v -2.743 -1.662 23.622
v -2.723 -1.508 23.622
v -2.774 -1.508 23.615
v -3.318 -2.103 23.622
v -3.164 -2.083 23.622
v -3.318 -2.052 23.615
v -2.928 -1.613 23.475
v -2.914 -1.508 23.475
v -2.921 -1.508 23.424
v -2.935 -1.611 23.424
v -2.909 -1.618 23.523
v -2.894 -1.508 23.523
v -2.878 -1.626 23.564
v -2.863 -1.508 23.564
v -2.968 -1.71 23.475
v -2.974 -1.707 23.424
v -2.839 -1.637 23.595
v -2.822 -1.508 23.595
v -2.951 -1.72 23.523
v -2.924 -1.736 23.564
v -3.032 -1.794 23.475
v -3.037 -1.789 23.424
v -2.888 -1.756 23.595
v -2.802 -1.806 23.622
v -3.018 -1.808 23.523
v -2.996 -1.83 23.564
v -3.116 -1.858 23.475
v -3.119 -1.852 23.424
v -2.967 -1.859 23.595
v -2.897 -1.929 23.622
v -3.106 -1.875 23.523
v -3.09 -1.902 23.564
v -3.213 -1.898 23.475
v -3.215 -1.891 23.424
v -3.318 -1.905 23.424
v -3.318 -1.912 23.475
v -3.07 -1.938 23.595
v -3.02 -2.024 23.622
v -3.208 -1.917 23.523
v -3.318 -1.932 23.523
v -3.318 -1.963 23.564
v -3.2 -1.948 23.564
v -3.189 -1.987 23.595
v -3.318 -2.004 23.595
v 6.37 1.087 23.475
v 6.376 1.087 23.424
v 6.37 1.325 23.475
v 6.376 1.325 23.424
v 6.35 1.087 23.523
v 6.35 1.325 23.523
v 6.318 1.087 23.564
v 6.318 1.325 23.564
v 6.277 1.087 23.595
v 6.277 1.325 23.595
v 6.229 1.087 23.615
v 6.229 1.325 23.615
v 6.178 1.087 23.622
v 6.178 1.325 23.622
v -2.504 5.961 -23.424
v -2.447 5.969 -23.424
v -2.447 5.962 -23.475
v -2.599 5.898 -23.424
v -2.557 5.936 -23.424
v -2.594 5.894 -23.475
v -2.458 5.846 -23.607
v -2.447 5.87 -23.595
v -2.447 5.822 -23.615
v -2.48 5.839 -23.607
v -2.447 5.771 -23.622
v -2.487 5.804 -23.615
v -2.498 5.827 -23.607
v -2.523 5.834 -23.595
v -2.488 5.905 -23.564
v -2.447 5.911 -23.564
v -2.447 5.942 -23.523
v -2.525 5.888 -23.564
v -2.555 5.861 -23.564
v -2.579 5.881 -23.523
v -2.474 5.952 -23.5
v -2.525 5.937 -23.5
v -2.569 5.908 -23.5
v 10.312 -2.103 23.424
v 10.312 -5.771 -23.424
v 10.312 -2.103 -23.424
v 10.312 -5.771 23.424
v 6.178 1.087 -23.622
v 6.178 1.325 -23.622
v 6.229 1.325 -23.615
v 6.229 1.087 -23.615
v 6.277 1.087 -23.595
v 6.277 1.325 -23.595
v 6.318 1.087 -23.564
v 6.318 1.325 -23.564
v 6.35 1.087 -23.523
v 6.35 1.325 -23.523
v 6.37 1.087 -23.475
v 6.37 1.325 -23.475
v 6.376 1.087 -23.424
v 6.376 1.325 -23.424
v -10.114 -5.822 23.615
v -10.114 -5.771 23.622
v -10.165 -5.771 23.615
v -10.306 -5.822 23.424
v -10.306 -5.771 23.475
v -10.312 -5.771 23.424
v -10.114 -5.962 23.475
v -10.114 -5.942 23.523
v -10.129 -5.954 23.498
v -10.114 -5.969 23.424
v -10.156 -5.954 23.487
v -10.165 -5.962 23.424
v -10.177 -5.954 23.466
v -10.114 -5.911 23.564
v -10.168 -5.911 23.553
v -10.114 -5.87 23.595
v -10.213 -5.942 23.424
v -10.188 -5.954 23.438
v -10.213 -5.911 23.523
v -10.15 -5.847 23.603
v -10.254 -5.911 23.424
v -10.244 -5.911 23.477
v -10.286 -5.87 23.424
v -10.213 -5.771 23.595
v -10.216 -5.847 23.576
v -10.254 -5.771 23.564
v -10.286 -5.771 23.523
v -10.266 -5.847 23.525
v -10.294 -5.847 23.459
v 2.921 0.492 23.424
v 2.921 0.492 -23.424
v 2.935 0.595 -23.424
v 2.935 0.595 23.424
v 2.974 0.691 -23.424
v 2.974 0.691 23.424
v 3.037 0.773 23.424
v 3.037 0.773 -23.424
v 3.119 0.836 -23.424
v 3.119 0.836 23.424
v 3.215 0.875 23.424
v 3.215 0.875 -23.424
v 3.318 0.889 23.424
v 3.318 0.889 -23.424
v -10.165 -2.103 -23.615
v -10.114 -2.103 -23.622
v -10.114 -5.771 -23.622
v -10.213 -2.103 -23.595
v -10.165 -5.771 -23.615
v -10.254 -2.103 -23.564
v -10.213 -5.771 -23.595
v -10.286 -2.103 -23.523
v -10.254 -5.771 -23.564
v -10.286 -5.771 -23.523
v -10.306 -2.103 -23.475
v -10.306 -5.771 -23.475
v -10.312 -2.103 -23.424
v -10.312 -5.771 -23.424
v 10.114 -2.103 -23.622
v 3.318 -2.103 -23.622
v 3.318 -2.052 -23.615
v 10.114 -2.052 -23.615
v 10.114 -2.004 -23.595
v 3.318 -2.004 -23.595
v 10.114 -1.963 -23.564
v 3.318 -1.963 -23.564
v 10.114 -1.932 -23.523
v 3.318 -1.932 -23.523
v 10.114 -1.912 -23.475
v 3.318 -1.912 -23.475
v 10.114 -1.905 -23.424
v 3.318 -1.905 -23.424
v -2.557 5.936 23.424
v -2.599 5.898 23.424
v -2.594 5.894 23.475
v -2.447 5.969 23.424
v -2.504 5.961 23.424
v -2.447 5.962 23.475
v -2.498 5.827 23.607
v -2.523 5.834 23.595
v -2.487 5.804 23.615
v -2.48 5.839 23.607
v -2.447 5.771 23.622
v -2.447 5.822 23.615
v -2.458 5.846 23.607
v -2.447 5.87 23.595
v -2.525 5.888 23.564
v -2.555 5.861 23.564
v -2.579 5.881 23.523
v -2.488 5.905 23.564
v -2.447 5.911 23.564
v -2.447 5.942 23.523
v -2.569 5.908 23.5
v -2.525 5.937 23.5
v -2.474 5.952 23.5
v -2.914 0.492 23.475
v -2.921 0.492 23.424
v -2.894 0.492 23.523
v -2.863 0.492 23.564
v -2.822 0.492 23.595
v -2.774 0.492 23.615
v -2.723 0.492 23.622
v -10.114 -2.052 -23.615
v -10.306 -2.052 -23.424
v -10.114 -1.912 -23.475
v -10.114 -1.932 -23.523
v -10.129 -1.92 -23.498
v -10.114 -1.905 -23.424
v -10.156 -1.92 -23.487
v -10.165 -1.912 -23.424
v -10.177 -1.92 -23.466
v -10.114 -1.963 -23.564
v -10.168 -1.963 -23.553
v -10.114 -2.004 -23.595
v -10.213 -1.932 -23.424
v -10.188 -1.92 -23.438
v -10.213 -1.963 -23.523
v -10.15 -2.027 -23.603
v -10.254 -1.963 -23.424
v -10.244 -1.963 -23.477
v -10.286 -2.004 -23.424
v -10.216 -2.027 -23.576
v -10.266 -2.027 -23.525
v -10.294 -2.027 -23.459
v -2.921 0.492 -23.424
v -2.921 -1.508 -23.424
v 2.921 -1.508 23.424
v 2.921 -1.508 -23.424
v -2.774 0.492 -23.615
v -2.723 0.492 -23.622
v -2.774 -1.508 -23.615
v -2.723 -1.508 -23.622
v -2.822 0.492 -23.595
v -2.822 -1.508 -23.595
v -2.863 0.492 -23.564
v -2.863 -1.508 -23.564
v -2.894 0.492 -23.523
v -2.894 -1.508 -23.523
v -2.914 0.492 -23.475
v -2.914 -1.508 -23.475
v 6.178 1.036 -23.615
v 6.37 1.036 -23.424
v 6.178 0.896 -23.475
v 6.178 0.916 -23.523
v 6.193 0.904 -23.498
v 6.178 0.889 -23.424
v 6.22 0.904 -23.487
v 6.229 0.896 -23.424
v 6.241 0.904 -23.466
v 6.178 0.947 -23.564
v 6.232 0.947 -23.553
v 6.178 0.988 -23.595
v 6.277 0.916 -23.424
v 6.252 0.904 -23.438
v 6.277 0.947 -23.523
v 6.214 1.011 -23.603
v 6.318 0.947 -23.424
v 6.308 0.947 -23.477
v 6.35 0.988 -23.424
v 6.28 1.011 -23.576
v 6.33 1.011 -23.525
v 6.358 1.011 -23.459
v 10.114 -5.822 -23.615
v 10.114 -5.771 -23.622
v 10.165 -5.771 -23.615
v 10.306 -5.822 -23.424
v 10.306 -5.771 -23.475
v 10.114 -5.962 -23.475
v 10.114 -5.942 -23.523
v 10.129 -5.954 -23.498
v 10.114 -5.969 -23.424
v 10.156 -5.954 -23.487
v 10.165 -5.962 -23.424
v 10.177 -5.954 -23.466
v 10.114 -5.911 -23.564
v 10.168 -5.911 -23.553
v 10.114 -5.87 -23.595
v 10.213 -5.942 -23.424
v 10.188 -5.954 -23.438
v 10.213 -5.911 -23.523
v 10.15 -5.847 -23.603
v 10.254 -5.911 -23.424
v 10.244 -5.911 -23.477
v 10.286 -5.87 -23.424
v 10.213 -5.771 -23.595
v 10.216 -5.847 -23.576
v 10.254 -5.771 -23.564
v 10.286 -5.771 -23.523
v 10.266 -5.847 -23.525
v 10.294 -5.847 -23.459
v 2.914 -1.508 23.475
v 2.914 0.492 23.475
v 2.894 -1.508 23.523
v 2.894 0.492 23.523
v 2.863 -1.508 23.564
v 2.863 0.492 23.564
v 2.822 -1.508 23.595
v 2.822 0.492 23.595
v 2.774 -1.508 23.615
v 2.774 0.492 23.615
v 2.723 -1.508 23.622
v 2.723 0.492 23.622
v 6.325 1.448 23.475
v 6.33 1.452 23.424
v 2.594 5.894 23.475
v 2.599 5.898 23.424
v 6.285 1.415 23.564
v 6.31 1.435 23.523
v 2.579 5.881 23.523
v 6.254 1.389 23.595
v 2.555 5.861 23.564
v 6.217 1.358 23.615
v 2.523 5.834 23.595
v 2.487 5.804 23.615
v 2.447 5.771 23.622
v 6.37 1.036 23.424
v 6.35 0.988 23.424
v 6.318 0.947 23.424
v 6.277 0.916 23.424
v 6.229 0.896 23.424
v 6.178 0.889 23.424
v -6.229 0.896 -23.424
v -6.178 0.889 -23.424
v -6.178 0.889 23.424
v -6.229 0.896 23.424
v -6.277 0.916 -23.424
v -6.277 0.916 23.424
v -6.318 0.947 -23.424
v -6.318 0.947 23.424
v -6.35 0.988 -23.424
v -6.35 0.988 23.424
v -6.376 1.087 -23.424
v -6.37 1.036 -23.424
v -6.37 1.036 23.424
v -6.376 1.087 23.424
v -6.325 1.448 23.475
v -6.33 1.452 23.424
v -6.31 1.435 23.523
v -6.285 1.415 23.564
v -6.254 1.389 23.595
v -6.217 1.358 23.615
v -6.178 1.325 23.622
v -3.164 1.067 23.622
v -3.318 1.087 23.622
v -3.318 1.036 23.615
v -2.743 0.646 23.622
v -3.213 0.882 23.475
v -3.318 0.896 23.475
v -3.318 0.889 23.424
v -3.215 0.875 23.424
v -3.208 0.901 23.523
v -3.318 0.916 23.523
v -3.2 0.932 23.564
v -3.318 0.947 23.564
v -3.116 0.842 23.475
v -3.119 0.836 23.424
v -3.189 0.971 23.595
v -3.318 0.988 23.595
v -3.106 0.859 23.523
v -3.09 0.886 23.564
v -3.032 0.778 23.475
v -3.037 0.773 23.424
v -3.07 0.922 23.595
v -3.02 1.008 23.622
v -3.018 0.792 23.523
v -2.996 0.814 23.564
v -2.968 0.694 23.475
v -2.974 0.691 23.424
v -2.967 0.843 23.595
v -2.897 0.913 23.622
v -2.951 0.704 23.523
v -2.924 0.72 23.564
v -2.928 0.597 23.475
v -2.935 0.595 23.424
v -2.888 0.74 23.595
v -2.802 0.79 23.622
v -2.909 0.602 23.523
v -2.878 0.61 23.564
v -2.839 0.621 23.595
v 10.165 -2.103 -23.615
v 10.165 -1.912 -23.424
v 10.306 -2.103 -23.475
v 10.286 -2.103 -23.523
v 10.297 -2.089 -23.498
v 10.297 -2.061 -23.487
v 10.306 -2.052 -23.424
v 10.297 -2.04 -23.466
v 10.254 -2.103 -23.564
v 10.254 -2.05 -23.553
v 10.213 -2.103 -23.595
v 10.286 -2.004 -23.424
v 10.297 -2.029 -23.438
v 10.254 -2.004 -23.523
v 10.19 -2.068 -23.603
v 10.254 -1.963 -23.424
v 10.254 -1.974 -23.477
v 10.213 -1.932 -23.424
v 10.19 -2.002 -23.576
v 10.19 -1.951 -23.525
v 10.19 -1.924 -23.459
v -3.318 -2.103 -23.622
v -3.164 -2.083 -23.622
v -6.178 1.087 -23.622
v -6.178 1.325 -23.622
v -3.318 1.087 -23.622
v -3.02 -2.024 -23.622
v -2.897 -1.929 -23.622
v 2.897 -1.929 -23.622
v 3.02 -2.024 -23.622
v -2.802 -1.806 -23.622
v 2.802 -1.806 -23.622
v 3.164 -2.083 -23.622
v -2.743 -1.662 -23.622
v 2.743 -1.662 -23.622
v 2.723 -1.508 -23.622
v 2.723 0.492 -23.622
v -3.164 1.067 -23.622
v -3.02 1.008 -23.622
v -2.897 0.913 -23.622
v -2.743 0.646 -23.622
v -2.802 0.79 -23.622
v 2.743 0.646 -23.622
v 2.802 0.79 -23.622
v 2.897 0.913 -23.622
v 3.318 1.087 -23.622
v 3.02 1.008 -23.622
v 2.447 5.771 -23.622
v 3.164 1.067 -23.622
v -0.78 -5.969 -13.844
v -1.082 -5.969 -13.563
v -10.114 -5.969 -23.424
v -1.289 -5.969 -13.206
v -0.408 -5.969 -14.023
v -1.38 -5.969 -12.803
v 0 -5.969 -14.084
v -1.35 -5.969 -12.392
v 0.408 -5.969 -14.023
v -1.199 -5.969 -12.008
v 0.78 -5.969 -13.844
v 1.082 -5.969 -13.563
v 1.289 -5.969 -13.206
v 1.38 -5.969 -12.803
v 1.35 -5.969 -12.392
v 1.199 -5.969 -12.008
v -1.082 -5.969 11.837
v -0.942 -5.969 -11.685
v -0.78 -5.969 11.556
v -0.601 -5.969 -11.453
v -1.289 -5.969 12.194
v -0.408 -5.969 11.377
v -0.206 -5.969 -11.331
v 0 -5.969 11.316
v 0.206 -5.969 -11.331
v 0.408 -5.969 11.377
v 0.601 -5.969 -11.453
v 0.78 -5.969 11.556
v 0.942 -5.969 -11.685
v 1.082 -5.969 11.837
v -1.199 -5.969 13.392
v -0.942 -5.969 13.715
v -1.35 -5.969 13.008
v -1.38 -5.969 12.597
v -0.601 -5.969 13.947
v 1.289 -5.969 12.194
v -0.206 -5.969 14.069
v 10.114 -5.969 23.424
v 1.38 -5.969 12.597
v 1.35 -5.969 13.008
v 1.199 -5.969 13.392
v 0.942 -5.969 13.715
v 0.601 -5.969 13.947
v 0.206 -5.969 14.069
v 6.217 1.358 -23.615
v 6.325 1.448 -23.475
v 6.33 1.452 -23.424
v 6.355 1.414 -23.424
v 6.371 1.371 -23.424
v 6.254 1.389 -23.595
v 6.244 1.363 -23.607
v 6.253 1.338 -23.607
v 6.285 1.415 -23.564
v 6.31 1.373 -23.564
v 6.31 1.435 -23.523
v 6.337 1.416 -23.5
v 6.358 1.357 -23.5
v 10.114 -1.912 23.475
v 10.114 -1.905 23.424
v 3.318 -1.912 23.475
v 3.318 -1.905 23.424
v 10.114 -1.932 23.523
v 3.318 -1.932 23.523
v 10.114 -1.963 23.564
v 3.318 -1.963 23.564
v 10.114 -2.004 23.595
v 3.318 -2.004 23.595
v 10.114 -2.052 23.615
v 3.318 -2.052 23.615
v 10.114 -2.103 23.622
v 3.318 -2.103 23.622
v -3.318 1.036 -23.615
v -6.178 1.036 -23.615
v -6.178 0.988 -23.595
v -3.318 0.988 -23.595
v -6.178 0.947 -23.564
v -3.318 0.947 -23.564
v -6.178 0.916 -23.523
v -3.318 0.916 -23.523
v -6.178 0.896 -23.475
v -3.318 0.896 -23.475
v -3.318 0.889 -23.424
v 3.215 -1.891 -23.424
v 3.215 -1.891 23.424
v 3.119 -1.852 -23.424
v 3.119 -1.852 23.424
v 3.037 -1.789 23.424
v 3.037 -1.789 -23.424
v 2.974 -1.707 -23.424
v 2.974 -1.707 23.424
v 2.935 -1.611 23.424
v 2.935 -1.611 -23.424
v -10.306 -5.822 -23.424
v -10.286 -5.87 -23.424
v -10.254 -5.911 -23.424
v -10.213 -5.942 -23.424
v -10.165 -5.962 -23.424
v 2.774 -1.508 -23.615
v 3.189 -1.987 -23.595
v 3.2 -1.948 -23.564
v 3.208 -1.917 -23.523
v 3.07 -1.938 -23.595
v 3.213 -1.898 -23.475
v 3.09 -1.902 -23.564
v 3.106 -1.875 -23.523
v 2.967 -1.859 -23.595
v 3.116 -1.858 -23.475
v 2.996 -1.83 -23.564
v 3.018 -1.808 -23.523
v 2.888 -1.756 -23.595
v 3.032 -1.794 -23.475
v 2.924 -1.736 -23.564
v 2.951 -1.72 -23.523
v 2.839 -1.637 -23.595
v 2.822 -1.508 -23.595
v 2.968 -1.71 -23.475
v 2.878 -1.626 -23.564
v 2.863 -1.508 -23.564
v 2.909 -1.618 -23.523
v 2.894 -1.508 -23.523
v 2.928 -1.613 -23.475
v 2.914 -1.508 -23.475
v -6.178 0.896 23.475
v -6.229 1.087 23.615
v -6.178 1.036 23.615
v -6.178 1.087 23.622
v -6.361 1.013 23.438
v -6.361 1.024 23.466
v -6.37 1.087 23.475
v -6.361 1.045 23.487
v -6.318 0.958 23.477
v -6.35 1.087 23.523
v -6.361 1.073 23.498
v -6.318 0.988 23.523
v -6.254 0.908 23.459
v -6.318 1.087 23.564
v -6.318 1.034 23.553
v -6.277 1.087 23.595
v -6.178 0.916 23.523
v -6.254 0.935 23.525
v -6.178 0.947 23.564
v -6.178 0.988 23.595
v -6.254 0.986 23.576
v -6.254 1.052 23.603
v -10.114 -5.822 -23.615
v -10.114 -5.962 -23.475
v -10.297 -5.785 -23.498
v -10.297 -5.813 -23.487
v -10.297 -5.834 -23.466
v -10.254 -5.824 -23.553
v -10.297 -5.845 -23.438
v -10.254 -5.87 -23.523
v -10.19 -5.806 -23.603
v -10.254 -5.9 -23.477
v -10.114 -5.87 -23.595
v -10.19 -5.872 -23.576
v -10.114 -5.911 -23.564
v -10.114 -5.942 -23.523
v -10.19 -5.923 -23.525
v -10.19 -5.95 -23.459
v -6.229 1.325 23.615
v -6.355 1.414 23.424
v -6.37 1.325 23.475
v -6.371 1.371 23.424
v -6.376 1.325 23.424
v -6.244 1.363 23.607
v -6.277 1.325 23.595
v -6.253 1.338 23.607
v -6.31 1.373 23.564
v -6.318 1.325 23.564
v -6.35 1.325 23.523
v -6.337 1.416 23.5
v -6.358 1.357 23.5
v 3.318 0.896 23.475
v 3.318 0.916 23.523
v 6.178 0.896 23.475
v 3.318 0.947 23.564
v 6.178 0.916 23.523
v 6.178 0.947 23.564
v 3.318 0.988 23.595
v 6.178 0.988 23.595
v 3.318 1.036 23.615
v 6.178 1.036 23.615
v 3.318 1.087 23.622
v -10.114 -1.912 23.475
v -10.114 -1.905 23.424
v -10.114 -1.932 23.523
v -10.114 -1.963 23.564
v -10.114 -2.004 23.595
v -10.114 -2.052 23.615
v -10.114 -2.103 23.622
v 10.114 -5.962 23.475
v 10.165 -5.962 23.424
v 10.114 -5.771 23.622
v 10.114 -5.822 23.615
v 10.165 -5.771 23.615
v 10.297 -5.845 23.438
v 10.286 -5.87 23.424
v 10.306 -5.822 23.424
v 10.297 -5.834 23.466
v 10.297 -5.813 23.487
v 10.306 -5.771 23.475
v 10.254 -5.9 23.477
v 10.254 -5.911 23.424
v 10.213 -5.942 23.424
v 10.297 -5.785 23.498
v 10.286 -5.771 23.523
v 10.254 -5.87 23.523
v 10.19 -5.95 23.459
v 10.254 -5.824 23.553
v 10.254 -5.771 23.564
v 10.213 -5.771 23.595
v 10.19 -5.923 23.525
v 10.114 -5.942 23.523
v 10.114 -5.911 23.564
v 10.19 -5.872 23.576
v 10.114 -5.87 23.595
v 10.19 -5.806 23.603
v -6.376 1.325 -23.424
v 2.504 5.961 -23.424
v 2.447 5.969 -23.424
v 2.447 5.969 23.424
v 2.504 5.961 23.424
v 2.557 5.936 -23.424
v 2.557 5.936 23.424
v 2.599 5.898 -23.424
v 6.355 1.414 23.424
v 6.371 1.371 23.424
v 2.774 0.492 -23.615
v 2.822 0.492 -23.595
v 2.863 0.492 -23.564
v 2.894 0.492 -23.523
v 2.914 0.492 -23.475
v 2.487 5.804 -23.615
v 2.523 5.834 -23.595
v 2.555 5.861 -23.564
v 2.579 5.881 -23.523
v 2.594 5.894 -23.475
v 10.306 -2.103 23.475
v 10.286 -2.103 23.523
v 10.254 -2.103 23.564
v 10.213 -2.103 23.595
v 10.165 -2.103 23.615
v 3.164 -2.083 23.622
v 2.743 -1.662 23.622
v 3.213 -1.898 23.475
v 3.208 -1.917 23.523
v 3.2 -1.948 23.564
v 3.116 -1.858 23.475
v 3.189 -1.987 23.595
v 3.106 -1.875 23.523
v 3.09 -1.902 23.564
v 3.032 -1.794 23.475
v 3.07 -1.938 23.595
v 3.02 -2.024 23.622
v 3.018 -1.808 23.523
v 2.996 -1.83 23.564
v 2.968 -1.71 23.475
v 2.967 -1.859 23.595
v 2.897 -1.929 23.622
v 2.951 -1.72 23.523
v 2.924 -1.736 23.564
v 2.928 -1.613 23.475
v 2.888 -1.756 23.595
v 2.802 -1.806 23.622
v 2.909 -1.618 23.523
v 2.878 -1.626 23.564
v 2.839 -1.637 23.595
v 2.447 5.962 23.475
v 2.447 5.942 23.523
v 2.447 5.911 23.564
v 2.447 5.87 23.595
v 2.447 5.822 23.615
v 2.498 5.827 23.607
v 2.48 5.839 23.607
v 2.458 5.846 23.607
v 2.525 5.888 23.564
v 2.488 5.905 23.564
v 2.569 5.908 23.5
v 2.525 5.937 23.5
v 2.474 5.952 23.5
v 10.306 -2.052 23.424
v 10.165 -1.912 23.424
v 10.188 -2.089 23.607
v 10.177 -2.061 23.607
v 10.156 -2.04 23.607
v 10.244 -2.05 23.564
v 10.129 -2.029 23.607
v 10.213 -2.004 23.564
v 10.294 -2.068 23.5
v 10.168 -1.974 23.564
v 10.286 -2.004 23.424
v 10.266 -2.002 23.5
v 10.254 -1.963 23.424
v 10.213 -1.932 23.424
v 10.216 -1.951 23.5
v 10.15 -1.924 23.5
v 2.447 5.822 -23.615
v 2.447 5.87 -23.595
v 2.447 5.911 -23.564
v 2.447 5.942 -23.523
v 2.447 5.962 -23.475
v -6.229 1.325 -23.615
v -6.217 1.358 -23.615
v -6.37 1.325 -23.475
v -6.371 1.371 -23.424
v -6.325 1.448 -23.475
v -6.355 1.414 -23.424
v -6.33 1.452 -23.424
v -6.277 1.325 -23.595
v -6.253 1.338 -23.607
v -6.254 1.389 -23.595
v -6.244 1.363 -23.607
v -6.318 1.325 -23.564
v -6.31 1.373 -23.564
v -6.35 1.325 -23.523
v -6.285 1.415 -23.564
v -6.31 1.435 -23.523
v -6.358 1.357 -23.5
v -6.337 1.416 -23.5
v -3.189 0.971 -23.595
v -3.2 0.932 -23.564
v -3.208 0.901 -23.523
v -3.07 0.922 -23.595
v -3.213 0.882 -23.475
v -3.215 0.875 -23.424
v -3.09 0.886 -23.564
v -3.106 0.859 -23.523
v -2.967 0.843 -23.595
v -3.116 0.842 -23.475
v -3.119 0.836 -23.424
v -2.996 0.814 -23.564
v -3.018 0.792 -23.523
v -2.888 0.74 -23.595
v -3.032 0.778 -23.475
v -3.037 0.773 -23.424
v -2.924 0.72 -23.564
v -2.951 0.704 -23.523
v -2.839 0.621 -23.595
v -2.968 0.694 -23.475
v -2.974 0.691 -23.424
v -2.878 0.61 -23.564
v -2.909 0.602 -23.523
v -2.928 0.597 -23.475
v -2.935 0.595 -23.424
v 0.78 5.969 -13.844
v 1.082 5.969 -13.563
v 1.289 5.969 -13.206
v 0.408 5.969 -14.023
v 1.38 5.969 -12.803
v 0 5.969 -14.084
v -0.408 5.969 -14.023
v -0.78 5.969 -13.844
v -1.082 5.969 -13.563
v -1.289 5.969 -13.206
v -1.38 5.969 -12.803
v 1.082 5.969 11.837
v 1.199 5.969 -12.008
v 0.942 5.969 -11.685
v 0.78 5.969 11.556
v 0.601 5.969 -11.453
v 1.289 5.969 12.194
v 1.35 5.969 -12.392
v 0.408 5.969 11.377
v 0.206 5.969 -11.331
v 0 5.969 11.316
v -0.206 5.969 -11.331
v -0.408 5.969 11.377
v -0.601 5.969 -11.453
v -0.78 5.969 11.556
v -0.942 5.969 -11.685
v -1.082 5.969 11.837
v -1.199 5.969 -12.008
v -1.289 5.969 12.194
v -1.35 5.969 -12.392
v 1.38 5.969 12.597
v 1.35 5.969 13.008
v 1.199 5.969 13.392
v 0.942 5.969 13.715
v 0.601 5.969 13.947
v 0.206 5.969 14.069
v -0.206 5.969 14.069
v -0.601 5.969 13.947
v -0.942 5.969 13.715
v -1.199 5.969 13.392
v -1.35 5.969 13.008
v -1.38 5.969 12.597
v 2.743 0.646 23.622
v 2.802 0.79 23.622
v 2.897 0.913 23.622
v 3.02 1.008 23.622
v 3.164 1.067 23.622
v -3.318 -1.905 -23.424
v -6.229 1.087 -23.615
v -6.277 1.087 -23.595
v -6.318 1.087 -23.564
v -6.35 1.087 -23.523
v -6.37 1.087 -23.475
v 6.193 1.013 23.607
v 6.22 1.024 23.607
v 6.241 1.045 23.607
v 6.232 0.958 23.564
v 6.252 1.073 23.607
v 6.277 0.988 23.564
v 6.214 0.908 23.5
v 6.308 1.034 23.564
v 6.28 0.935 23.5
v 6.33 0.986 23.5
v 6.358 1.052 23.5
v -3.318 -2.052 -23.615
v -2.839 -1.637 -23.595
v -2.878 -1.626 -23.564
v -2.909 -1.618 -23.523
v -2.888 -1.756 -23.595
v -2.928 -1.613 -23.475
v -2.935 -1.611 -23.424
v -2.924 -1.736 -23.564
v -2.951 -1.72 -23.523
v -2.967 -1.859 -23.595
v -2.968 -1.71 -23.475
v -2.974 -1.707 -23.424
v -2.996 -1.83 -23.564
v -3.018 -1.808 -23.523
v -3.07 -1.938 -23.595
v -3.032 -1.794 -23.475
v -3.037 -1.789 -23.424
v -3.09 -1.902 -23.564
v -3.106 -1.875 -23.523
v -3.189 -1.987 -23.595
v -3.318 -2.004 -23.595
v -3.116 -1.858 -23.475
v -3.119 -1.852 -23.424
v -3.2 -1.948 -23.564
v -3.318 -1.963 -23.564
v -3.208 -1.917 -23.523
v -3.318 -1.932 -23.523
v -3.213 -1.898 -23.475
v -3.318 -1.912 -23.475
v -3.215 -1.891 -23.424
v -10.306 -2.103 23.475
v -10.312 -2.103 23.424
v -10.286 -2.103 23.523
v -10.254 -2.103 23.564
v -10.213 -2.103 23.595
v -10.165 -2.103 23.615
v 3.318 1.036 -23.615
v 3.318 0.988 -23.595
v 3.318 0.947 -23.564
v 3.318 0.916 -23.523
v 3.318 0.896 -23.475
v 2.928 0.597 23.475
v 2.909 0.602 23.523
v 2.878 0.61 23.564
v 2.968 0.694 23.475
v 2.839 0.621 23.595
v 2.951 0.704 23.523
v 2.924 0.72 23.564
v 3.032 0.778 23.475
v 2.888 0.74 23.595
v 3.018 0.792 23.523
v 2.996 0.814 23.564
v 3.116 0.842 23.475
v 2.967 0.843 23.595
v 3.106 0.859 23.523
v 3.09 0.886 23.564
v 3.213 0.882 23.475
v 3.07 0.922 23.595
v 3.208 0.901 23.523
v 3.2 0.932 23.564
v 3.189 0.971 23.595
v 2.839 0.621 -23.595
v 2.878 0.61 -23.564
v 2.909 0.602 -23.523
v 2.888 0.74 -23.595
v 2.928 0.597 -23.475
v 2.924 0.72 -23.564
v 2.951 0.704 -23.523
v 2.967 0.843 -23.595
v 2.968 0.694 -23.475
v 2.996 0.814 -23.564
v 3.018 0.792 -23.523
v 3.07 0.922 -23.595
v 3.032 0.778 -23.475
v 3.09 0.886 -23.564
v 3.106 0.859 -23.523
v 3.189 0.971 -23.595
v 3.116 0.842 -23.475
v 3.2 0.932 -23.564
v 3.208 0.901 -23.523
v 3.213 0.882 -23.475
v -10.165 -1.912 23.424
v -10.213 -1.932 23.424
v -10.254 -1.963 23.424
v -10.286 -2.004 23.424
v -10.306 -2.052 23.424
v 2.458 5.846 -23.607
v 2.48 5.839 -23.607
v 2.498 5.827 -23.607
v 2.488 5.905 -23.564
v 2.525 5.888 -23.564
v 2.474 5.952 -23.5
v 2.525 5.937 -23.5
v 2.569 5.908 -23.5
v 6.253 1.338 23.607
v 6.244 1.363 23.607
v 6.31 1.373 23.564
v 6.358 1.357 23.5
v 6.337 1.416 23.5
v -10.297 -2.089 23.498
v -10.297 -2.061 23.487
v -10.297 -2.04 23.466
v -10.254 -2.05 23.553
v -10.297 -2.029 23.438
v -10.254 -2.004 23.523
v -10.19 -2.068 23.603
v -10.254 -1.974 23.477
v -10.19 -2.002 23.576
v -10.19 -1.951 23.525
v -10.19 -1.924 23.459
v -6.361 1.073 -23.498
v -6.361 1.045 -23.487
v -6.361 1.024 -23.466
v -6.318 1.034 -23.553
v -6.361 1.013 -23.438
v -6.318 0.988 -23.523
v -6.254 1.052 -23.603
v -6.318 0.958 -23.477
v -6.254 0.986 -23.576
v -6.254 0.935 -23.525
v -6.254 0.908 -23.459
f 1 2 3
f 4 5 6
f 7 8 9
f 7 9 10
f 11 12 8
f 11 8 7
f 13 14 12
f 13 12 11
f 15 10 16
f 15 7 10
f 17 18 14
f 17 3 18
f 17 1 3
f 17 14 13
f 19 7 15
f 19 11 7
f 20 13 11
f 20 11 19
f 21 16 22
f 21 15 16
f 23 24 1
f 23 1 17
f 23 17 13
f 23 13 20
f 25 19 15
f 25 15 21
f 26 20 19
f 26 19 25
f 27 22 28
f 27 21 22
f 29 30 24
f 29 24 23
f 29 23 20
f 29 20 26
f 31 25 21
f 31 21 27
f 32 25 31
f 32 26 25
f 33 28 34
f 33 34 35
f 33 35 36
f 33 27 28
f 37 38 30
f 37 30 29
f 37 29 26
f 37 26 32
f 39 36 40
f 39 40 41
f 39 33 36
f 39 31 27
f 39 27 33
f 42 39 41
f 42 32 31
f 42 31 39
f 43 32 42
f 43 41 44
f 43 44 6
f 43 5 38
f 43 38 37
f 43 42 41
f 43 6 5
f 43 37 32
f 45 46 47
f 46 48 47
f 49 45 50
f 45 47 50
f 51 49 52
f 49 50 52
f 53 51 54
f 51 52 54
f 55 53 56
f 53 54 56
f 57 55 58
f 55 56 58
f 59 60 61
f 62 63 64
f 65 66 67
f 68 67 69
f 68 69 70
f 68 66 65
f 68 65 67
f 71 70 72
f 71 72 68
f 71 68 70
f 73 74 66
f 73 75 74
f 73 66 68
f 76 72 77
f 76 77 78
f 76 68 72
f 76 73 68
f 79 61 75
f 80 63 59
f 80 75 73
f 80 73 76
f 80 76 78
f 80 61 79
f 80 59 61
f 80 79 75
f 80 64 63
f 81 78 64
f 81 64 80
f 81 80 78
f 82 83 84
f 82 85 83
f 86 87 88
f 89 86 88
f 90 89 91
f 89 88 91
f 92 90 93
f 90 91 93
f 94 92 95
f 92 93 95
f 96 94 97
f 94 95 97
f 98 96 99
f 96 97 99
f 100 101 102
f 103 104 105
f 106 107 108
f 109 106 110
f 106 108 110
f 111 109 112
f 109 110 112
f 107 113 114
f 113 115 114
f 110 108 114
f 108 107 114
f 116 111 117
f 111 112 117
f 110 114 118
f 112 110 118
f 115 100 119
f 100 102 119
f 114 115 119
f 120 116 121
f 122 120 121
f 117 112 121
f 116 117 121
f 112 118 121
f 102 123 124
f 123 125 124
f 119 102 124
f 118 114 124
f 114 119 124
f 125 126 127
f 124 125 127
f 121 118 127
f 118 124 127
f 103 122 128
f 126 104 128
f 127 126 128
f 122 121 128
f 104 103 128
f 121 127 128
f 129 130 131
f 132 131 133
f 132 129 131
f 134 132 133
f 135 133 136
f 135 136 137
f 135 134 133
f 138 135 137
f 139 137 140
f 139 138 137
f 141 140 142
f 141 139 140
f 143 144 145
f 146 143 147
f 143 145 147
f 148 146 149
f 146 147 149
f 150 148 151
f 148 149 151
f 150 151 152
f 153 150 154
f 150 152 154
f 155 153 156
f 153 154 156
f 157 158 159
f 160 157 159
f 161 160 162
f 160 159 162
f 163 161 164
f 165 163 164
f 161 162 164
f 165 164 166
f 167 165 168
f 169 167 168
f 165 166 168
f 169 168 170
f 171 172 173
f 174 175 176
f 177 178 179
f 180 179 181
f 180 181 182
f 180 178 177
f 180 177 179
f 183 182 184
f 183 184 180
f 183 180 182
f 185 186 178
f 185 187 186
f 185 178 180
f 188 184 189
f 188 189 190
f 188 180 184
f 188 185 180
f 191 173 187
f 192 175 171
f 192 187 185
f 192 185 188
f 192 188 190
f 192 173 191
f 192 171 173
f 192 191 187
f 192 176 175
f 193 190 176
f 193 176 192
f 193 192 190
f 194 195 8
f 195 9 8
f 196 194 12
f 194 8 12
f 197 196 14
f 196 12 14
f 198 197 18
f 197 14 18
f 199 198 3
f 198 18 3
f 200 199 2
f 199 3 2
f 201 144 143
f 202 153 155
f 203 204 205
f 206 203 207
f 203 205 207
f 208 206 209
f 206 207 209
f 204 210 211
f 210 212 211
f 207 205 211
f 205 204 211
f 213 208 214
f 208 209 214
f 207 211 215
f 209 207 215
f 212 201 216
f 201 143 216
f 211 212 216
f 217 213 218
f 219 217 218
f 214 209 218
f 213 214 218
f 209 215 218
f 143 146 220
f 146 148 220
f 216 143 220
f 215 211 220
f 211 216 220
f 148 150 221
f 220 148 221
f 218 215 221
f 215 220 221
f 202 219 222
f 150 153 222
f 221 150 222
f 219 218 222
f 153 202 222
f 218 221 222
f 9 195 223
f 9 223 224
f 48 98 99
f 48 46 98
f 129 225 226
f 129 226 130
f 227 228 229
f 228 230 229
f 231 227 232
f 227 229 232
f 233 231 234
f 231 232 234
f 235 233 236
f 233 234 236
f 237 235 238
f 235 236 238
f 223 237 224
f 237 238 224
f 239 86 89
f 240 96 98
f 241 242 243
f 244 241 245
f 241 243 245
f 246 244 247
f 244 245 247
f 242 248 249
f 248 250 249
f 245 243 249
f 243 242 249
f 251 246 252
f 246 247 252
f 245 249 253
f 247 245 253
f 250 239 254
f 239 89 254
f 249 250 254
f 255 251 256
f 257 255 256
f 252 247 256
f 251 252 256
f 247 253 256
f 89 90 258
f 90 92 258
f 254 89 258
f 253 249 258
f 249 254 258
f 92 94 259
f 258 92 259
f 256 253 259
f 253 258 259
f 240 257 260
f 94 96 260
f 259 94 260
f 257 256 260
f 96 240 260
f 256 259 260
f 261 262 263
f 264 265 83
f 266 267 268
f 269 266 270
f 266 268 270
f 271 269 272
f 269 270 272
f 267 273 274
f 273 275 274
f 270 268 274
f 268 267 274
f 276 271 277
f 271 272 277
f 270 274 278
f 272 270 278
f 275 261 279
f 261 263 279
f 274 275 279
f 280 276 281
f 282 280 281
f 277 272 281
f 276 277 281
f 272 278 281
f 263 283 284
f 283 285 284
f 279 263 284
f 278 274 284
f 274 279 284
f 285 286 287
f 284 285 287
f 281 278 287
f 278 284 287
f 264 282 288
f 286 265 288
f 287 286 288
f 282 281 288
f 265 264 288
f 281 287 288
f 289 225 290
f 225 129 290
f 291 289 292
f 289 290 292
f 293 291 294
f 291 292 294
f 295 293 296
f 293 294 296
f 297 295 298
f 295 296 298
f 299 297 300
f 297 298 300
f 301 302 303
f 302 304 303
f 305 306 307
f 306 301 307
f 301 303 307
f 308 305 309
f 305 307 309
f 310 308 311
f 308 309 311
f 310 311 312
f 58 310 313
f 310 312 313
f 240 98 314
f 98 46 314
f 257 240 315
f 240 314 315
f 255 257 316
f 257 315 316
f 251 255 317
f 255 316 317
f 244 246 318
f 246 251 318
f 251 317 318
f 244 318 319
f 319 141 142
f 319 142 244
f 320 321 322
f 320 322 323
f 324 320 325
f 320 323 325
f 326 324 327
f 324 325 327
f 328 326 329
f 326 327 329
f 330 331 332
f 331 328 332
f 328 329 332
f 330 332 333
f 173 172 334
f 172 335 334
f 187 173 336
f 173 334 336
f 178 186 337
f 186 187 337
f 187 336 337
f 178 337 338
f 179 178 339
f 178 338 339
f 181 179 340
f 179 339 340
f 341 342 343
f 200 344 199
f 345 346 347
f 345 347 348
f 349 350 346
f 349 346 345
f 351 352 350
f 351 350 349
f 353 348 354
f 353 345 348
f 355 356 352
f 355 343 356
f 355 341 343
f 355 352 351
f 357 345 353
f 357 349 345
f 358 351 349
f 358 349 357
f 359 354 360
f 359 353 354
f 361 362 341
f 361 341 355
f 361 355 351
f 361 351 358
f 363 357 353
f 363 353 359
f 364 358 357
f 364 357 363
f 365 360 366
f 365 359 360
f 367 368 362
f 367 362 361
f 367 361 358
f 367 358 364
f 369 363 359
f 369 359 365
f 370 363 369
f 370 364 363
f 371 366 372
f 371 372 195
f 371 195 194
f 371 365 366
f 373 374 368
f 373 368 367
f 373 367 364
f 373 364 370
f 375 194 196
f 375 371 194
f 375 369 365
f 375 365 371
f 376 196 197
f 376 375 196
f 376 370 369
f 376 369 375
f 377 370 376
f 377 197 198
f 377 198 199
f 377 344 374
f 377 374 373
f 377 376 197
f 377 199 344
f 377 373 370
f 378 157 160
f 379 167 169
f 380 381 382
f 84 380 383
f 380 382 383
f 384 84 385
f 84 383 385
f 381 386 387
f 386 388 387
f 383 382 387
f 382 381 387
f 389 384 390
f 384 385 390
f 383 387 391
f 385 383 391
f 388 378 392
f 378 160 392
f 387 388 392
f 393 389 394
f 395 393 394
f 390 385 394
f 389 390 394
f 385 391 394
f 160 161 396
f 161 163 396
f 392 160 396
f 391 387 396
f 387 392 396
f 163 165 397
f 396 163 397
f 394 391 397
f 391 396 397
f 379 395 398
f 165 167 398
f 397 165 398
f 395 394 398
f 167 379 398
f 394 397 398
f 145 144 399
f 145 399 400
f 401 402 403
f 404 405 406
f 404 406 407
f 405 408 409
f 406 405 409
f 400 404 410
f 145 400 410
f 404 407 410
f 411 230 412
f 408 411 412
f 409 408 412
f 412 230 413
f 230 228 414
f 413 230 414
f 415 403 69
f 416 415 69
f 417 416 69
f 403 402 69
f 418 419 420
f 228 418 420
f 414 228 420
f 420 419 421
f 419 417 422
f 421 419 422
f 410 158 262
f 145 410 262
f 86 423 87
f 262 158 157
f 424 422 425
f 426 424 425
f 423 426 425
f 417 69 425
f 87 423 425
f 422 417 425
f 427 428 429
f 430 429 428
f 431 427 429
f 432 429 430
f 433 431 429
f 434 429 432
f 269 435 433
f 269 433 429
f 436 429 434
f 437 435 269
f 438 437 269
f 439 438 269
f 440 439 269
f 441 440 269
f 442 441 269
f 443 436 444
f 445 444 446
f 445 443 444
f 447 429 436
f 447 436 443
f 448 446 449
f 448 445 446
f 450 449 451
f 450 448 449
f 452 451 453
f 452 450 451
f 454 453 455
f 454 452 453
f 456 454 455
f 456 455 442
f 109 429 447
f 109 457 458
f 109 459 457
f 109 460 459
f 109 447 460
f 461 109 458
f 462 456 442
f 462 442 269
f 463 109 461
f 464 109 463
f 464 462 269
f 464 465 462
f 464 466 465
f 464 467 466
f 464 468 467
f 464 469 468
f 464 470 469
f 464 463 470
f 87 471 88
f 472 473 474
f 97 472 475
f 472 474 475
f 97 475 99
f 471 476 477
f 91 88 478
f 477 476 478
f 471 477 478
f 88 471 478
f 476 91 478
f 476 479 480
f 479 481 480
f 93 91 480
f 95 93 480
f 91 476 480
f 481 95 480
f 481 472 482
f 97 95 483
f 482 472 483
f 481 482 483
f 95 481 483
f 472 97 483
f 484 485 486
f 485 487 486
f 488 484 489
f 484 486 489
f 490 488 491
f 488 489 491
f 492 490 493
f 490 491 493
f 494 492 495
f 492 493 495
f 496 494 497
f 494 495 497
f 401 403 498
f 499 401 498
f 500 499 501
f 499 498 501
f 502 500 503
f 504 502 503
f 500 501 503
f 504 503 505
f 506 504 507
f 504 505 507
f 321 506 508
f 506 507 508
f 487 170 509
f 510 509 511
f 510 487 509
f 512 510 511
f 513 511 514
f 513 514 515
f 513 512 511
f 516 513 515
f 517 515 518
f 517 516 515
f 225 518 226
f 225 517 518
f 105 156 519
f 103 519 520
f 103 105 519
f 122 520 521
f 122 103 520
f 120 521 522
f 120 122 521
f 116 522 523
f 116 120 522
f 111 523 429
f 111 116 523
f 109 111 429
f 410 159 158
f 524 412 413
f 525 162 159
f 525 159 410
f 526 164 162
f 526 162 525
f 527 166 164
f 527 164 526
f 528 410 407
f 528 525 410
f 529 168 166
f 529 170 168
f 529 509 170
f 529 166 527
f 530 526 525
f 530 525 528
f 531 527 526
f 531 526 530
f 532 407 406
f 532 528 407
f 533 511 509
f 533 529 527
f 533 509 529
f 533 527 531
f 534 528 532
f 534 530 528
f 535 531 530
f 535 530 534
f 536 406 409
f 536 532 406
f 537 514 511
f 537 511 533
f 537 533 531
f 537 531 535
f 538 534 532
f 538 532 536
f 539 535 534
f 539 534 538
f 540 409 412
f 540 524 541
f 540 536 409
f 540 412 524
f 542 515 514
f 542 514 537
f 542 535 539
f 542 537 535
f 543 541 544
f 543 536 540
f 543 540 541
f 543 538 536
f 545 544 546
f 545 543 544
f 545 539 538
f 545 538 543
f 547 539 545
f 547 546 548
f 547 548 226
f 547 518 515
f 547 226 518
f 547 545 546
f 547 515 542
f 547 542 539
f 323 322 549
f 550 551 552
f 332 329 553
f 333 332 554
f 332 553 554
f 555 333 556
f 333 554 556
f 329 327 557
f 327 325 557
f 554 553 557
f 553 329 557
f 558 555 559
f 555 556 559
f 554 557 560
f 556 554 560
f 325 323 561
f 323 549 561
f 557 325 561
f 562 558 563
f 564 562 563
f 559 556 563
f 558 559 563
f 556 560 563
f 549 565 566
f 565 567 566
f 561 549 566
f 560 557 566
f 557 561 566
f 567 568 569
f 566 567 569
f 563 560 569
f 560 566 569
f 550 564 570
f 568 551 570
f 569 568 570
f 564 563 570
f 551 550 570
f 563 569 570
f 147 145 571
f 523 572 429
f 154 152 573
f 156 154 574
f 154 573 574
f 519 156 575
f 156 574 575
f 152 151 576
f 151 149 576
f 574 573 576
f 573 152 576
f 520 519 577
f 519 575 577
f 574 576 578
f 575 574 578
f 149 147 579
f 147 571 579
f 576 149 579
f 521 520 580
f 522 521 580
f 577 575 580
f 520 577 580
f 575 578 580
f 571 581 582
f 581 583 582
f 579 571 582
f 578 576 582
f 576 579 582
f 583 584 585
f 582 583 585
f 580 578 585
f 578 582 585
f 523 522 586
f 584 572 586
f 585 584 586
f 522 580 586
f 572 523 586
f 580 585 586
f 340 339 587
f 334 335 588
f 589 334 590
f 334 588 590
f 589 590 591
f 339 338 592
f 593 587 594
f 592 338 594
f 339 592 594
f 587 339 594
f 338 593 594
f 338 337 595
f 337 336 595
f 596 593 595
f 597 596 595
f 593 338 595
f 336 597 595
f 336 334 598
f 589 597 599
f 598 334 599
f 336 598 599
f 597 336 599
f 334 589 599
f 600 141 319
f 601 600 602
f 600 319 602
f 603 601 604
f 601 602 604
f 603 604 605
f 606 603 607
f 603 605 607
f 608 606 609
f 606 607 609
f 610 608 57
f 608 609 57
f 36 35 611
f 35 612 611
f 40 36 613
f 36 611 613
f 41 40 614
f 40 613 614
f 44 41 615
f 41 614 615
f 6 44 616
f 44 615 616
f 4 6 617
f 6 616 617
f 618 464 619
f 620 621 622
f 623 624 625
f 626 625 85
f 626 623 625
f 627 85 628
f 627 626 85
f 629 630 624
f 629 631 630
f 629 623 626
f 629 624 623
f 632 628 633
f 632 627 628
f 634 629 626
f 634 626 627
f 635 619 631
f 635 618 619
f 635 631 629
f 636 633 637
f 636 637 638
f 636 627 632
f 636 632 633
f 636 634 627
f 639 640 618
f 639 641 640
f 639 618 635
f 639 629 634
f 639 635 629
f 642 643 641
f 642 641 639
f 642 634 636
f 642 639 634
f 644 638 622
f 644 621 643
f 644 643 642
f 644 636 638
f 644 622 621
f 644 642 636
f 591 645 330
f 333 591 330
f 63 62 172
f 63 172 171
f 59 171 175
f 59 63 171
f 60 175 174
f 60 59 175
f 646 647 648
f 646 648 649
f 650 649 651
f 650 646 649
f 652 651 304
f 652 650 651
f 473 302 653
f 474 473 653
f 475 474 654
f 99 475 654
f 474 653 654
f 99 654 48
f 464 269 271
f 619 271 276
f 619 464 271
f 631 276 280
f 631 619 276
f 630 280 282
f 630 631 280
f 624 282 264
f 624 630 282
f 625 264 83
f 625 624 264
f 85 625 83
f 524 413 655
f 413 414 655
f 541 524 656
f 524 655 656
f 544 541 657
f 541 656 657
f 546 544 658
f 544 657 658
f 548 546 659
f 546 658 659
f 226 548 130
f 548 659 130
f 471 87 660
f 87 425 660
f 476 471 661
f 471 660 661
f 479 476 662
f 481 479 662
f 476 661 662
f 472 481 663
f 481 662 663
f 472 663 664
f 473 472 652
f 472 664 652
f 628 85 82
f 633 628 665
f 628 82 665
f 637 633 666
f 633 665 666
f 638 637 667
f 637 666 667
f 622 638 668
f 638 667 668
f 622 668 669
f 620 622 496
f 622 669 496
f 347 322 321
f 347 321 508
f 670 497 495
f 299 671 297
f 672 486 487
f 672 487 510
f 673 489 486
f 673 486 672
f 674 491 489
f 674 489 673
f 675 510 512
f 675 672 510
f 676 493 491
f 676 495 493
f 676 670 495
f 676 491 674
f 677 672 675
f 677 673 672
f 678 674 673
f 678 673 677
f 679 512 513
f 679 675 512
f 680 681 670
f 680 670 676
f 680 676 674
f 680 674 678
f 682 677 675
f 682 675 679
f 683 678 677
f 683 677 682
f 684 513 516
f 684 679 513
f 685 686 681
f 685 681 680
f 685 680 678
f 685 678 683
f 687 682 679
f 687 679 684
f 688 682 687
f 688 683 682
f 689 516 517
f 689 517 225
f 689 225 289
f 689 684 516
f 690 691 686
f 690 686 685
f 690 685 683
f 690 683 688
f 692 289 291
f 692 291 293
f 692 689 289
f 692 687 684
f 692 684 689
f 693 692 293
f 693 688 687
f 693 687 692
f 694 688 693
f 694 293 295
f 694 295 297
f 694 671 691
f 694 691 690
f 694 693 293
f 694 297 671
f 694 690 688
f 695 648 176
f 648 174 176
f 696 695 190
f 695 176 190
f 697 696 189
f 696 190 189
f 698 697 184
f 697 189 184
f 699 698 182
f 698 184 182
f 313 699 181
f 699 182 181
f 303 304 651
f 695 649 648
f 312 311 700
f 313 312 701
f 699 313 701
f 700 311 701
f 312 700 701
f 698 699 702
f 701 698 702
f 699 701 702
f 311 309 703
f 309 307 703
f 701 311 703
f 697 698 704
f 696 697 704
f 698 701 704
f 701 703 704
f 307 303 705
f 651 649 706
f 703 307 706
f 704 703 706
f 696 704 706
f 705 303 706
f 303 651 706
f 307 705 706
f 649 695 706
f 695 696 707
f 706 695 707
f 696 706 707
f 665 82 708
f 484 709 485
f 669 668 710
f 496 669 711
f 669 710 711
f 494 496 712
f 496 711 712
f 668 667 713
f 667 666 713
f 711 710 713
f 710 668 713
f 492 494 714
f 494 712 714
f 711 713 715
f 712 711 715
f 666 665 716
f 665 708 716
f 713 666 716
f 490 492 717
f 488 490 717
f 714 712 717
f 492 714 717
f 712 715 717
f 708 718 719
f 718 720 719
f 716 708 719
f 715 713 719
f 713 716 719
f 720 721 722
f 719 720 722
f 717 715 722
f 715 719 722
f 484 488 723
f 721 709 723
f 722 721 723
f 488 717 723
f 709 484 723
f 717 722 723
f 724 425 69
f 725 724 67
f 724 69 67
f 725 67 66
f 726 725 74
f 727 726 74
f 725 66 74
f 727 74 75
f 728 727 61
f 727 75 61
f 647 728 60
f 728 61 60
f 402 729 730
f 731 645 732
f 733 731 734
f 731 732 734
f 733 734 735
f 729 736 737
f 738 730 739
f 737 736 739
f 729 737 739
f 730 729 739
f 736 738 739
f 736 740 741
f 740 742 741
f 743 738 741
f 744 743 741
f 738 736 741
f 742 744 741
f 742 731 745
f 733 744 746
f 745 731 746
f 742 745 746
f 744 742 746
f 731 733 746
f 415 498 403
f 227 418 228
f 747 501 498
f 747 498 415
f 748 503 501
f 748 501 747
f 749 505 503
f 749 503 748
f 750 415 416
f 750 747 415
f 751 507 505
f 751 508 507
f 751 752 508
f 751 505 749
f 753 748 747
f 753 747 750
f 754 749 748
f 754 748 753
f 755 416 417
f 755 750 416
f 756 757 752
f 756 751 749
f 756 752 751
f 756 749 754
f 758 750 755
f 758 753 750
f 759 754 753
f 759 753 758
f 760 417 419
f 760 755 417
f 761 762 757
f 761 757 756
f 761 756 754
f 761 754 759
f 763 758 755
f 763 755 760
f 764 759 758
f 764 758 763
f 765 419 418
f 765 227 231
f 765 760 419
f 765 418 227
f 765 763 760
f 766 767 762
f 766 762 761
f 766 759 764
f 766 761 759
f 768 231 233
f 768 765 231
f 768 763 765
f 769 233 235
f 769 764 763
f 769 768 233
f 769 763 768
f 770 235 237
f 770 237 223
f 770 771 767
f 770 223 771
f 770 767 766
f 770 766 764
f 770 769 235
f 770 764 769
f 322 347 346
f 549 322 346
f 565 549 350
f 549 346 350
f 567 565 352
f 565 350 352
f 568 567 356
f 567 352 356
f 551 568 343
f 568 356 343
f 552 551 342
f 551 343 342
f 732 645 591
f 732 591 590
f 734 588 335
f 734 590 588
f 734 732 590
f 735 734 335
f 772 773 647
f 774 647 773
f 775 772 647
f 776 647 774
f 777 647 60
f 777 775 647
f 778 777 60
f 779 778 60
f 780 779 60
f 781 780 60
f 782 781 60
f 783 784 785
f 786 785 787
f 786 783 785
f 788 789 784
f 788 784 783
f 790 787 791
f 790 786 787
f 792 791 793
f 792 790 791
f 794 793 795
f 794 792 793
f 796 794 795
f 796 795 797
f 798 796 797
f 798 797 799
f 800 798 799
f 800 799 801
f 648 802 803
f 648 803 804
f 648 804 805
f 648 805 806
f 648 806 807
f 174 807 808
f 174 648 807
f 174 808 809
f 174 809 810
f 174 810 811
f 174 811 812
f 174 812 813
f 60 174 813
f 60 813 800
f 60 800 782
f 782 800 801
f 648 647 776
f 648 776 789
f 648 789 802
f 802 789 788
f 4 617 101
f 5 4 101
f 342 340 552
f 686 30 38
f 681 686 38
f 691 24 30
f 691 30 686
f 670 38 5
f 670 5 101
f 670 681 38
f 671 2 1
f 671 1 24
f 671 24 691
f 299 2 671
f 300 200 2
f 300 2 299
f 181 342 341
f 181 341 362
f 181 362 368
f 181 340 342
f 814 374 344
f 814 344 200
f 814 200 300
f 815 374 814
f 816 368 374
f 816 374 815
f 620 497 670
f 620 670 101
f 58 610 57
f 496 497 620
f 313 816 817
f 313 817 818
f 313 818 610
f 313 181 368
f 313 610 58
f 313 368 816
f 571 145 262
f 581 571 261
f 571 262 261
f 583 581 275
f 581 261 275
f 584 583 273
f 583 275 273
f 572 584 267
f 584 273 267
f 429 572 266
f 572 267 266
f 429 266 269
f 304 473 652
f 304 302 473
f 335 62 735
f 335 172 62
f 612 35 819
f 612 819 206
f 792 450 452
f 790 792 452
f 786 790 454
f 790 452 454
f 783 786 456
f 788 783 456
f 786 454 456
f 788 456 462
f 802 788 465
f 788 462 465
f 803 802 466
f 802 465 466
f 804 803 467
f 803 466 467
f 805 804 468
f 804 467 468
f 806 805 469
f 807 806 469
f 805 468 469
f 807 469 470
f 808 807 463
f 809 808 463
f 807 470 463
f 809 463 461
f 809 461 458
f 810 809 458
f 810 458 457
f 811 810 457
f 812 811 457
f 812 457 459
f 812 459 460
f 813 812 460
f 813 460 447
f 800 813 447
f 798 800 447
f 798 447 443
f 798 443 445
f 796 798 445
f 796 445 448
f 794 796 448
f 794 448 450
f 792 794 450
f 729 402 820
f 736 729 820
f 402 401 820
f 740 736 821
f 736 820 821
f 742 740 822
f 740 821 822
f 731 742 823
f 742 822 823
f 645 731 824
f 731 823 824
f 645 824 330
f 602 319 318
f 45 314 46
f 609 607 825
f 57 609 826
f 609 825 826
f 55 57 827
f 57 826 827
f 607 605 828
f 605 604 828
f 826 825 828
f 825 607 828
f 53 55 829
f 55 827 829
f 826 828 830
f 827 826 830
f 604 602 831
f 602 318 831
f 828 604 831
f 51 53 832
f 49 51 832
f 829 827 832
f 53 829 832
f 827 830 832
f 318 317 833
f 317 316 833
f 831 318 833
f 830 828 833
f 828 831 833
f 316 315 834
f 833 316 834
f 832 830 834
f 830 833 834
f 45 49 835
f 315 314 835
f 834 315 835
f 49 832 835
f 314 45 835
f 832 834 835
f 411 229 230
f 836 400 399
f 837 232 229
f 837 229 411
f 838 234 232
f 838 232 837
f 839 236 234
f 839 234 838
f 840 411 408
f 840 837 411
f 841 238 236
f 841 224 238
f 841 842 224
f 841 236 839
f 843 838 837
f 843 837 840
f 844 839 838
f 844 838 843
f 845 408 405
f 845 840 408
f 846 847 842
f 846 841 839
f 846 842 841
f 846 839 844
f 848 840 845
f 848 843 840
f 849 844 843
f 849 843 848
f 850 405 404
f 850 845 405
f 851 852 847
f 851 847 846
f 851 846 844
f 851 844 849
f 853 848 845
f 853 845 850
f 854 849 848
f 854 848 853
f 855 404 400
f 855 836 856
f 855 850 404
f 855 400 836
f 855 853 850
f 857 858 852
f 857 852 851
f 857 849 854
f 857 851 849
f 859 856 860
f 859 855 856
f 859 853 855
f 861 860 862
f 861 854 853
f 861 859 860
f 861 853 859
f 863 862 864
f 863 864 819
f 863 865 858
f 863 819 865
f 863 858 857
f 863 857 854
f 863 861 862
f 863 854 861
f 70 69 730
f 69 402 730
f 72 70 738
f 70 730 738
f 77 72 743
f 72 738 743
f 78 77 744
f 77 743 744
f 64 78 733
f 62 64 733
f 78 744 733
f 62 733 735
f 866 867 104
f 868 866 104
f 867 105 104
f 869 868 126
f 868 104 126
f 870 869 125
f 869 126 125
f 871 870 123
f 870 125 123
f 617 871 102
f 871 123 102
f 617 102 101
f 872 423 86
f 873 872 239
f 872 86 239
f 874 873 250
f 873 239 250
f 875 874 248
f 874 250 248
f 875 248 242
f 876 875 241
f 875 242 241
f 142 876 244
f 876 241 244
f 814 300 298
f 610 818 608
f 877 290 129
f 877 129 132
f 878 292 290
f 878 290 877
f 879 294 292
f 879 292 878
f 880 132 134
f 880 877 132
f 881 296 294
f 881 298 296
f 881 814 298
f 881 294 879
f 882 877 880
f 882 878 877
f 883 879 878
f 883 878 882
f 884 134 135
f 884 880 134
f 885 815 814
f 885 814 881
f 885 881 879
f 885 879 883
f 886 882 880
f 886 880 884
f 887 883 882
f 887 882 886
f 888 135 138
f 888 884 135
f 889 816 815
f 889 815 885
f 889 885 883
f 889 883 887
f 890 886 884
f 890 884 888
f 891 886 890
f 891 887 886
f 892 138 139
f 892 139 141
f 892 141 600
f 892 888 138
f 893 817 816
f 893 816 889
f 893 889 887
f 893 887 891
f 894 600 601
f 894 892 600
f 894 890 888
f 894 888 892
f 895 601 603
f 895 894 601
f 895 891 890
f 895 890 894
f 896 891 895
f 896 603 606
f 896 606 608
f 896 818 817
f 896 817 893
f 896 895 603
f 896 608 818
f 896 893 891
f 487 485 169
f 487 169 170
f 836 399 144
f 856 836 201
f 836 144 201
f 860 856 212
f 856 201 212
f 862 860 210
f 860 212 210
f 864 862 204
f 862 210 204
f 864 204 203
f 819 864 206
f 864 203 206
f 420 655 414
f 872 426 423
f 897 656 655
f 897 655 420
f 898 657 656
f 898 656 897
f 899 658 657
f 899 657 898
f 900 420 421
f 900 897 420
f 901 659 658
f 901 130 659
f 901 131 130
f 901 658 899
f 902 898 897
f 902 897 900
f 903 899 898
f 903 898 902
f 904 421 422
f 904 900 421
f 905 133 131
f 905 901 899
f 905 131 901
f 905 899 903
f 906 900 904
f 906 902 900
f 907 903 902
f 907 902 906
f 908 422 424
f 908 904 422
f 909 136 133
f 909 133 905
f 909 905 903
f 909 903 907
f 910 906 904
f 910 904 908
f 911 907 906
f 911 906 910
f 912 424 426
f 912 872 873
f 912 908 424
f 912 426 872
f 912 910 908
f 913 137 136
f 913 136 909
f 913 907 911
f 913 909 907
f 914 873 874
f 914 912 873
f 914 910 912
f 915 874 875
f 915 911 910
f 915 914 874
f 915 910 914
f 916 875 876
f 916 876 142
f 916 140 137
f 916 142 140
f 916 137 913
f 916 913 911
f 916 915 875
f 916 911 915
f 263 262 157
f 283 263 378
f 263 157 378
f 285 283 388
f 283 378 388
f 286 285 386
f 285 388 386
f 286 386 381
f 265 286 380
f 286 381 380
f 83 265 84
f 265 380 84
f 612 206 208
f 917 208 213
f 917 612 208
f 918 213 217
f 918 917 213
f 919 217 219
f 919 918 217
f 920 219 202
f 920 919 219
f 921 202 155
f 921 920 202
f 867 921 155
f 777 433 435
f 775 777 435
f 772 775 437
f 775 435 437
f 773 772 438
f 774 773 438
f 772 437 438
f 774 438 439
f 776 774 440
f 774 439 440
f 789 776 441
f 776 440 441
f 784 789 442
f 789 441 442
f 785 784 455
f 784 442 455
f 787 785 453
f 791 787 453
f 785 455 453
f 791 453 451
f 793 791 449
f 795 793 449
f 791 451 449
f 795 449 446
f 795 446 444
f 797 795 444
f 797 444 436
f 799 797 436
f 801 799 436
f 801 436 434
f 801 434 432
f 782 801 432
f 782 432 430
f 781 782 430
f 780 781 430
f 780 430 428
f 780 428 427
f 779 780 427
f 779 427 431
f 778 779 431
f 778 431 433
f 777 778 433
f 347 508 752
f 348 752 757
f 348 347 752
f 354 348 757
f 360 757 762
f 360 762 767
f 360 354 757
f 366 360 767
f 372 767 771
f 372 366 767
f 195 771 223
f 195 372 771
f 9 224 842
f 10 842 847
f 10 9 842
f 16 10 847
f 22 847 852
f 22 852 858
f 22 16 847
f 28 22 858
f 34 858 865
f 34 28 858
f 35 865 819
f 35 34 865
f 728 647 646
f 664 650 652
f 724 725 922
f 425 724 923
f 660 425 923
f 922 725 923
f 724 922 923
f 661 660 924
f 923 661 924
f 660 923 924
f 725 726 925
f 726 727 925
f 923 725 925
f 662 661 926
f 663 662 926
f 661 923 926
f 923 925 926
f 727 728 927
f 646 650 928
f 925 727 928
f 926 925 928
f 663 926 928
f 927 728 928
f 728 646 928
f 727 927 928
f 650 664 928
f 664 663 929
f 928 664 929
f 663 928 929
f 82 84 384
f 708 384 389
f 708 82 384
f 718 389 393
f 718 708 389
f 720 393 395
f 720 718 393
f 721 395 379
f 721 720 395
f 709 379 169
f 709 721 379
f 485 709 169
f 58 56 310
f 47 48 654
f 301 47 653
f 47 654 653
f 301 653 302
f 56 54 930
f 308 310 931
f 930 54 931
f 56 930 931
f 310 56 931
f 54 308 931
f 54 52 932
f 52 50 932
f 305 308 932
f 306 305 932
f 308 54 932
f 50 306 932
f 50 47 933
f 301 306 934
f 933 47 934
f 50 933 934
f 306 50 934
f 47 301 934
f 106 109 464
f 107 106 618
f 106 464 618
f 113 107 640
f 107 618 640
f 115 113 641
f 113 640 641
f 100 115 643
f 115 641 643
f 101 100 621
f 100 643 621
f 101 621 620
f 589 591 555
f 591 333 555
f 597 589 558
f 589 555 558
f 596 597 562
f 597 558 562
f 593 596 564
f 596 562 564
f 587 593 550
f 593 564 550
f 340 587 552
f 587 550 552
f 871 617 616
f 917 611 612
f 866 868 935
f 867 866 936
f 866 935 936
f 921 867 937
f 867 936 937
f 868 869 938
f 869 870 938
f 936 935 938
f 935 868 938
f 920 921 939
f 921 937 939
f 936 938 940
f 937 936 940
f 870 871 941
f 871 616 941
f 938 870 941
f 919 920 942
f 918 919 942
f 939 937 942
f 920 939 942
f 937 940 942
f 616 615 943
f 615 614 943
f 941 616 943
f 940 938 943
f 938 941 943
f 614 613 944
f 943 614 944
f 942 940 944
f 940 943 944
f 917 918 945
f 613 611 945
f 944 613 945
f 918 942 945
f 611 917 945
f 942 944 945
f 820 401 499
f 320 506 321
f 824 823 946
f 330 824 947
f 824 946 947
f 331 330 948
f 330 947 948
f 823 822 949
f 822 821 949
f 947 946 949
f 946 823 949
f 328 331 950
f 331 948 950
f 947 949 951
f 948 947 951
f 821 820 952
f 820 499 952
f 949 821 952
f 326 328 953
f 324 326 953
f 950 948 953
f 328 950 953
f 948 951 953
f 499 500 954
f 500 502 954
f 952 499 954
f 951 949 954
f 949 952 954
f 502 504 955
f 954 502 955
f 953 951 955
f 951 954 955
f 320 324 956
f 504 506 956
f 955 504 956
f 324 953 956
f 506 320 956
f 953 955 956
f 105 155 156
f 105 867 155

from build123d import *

# Parameters (mm, degrees)
BOSS_EXTRUDE1_DEPTH = 23.622
SKETCH5_R           = 1.3843
CUT_EXTRUDE1_DEPTH  = 29.405286863
FILLET1_R           = 0.396875
FILLET2_R           = 0.1984375


with BuildPart() as part:
    # Sketch3 → Boss-Extrude1 (new, symmetric)
    with BuildSketch(Plane.XY):
        Polygon((-6.376363514, 1.397), (-6.376363514, 0.889), (-2.921, 0.889), (-2.921, -1.905), (-10.3124, -1.905), (-10.3124, -5.969), (10.3124, -5.969), (10.3124, -1.905), (2.921, -1.905), (2.921, 0.889), (6.376363514, 0.889), (6.376363514, 1.397), (2.54, 5.969), (-2.54, 5.969), align=None)
    extrude(amount=BOSS_EXTRUDE1_DEPTH, both=True)

    # Sketch5 → Cut-Extrude1 (cut, through all)
    with BuildSketch(Plane.XZ.offset(5.969)):
        with Locations(Location((0, 12.7, 0), (0, 0, 270))):
            Circle(SKETCH5_R)
        with Locations(Location((0, -12.7, 0), (0, 0, 270))):
            Circle(SKETCH5_R)
    extrude(amount=-CUT_EXTRUDE1_DEPTH, mode=Mode.SUBTRACT)

    # Fillet1
    fillet1_edges = [part.edges().sort_by_distance(p)[0] for p in [
        (2.921, 0.889, 0),
        (2.921, -1.905, 0),
        (-2.921, -1.905, 0),
        (-2.921, 0.889, 0),
    ]]
    fillet(fillet1_edges, radius=FILLET1_R)

    # Fillet2
    fillet2_edges = [part.edges().sort_by_distance(p)[0] for p in [
        (-4.847119257, 0.889, 23.622),
        (0, 5.969, -23.622),
        (4.458181757, 3.683, -23.622),
        (6.376363514, 1.143, -23.622),
        (6.8151375, -1.905, -23.622),
        (10.3124, -3.937, -23.622),
        (0, -5.969, -23.622),
        (-10.3124, -3.937, -23.622),
        (-4.847119257, 0.889, -23.622),
        (-6.376363514, 1.143, -23.622),
        (-4.458181757, 3.683, -23.622),
        (-10.3124, -3.937, 23.622),
        (0, -5.969, 23.622),
        (-2.54, 5.969, 0),
        (2.54, 5.969, 0),
        (6.376363514, 1.397, 0),
        (6.376363514, 0.889, 0),
        (10.3124, -1.905, 0),
        (10.3124, -5.969, 0),
        (-10.3124, -5.969, 0),
        (-10.3124, -1.905, 0),
        (-6.376363514, 0.889, 0),
        (-6.376363514, 1.397, 0),
        (10.3124, -3.937, 23.622),
        (6.8151375, -1.905, 23.622),
        (6.376363514, 1.143, 23.622),
        (-4.458181757, 3.683, 23.622),
        (4.458181757, 3.683, 23.622),
        (0, 5.969, 23.622),
        (4.847119257, 0.889, -23.622),
        (4.847119257, 0.889, 23.622),
        (2.921, -0.508, -23.622),
        (2.921, -0.508, 23.622),
        (-2.921, -0.508, -23.622),
        (-2.921, -0.508, 23.622),
        (-6.8151375, -1.905, -23.622),
        (-6.8151375, -1.905, 23.622),
        (3.037241996, 0.772758004, -23.622),
        (3.037241996, 0.772758004, 23.622),
        (-3.037241996, 0.772758004, -23.622),
        (-3.037241996, 0.772758004, 23.622),
        (-3.037241996, -1.788758004, -23.622),
        (-3.037241996, -1.788758004, 23.622),
        (3.037241996, -1.788758004, -23.622),
        (3.037241996, -1.788758004, 23.622),
        (-6.376363514, 1.143, 23.622),
    ]]
    fillet(fillet2_edges, radius=FILLET2_R)


solid = part.part
